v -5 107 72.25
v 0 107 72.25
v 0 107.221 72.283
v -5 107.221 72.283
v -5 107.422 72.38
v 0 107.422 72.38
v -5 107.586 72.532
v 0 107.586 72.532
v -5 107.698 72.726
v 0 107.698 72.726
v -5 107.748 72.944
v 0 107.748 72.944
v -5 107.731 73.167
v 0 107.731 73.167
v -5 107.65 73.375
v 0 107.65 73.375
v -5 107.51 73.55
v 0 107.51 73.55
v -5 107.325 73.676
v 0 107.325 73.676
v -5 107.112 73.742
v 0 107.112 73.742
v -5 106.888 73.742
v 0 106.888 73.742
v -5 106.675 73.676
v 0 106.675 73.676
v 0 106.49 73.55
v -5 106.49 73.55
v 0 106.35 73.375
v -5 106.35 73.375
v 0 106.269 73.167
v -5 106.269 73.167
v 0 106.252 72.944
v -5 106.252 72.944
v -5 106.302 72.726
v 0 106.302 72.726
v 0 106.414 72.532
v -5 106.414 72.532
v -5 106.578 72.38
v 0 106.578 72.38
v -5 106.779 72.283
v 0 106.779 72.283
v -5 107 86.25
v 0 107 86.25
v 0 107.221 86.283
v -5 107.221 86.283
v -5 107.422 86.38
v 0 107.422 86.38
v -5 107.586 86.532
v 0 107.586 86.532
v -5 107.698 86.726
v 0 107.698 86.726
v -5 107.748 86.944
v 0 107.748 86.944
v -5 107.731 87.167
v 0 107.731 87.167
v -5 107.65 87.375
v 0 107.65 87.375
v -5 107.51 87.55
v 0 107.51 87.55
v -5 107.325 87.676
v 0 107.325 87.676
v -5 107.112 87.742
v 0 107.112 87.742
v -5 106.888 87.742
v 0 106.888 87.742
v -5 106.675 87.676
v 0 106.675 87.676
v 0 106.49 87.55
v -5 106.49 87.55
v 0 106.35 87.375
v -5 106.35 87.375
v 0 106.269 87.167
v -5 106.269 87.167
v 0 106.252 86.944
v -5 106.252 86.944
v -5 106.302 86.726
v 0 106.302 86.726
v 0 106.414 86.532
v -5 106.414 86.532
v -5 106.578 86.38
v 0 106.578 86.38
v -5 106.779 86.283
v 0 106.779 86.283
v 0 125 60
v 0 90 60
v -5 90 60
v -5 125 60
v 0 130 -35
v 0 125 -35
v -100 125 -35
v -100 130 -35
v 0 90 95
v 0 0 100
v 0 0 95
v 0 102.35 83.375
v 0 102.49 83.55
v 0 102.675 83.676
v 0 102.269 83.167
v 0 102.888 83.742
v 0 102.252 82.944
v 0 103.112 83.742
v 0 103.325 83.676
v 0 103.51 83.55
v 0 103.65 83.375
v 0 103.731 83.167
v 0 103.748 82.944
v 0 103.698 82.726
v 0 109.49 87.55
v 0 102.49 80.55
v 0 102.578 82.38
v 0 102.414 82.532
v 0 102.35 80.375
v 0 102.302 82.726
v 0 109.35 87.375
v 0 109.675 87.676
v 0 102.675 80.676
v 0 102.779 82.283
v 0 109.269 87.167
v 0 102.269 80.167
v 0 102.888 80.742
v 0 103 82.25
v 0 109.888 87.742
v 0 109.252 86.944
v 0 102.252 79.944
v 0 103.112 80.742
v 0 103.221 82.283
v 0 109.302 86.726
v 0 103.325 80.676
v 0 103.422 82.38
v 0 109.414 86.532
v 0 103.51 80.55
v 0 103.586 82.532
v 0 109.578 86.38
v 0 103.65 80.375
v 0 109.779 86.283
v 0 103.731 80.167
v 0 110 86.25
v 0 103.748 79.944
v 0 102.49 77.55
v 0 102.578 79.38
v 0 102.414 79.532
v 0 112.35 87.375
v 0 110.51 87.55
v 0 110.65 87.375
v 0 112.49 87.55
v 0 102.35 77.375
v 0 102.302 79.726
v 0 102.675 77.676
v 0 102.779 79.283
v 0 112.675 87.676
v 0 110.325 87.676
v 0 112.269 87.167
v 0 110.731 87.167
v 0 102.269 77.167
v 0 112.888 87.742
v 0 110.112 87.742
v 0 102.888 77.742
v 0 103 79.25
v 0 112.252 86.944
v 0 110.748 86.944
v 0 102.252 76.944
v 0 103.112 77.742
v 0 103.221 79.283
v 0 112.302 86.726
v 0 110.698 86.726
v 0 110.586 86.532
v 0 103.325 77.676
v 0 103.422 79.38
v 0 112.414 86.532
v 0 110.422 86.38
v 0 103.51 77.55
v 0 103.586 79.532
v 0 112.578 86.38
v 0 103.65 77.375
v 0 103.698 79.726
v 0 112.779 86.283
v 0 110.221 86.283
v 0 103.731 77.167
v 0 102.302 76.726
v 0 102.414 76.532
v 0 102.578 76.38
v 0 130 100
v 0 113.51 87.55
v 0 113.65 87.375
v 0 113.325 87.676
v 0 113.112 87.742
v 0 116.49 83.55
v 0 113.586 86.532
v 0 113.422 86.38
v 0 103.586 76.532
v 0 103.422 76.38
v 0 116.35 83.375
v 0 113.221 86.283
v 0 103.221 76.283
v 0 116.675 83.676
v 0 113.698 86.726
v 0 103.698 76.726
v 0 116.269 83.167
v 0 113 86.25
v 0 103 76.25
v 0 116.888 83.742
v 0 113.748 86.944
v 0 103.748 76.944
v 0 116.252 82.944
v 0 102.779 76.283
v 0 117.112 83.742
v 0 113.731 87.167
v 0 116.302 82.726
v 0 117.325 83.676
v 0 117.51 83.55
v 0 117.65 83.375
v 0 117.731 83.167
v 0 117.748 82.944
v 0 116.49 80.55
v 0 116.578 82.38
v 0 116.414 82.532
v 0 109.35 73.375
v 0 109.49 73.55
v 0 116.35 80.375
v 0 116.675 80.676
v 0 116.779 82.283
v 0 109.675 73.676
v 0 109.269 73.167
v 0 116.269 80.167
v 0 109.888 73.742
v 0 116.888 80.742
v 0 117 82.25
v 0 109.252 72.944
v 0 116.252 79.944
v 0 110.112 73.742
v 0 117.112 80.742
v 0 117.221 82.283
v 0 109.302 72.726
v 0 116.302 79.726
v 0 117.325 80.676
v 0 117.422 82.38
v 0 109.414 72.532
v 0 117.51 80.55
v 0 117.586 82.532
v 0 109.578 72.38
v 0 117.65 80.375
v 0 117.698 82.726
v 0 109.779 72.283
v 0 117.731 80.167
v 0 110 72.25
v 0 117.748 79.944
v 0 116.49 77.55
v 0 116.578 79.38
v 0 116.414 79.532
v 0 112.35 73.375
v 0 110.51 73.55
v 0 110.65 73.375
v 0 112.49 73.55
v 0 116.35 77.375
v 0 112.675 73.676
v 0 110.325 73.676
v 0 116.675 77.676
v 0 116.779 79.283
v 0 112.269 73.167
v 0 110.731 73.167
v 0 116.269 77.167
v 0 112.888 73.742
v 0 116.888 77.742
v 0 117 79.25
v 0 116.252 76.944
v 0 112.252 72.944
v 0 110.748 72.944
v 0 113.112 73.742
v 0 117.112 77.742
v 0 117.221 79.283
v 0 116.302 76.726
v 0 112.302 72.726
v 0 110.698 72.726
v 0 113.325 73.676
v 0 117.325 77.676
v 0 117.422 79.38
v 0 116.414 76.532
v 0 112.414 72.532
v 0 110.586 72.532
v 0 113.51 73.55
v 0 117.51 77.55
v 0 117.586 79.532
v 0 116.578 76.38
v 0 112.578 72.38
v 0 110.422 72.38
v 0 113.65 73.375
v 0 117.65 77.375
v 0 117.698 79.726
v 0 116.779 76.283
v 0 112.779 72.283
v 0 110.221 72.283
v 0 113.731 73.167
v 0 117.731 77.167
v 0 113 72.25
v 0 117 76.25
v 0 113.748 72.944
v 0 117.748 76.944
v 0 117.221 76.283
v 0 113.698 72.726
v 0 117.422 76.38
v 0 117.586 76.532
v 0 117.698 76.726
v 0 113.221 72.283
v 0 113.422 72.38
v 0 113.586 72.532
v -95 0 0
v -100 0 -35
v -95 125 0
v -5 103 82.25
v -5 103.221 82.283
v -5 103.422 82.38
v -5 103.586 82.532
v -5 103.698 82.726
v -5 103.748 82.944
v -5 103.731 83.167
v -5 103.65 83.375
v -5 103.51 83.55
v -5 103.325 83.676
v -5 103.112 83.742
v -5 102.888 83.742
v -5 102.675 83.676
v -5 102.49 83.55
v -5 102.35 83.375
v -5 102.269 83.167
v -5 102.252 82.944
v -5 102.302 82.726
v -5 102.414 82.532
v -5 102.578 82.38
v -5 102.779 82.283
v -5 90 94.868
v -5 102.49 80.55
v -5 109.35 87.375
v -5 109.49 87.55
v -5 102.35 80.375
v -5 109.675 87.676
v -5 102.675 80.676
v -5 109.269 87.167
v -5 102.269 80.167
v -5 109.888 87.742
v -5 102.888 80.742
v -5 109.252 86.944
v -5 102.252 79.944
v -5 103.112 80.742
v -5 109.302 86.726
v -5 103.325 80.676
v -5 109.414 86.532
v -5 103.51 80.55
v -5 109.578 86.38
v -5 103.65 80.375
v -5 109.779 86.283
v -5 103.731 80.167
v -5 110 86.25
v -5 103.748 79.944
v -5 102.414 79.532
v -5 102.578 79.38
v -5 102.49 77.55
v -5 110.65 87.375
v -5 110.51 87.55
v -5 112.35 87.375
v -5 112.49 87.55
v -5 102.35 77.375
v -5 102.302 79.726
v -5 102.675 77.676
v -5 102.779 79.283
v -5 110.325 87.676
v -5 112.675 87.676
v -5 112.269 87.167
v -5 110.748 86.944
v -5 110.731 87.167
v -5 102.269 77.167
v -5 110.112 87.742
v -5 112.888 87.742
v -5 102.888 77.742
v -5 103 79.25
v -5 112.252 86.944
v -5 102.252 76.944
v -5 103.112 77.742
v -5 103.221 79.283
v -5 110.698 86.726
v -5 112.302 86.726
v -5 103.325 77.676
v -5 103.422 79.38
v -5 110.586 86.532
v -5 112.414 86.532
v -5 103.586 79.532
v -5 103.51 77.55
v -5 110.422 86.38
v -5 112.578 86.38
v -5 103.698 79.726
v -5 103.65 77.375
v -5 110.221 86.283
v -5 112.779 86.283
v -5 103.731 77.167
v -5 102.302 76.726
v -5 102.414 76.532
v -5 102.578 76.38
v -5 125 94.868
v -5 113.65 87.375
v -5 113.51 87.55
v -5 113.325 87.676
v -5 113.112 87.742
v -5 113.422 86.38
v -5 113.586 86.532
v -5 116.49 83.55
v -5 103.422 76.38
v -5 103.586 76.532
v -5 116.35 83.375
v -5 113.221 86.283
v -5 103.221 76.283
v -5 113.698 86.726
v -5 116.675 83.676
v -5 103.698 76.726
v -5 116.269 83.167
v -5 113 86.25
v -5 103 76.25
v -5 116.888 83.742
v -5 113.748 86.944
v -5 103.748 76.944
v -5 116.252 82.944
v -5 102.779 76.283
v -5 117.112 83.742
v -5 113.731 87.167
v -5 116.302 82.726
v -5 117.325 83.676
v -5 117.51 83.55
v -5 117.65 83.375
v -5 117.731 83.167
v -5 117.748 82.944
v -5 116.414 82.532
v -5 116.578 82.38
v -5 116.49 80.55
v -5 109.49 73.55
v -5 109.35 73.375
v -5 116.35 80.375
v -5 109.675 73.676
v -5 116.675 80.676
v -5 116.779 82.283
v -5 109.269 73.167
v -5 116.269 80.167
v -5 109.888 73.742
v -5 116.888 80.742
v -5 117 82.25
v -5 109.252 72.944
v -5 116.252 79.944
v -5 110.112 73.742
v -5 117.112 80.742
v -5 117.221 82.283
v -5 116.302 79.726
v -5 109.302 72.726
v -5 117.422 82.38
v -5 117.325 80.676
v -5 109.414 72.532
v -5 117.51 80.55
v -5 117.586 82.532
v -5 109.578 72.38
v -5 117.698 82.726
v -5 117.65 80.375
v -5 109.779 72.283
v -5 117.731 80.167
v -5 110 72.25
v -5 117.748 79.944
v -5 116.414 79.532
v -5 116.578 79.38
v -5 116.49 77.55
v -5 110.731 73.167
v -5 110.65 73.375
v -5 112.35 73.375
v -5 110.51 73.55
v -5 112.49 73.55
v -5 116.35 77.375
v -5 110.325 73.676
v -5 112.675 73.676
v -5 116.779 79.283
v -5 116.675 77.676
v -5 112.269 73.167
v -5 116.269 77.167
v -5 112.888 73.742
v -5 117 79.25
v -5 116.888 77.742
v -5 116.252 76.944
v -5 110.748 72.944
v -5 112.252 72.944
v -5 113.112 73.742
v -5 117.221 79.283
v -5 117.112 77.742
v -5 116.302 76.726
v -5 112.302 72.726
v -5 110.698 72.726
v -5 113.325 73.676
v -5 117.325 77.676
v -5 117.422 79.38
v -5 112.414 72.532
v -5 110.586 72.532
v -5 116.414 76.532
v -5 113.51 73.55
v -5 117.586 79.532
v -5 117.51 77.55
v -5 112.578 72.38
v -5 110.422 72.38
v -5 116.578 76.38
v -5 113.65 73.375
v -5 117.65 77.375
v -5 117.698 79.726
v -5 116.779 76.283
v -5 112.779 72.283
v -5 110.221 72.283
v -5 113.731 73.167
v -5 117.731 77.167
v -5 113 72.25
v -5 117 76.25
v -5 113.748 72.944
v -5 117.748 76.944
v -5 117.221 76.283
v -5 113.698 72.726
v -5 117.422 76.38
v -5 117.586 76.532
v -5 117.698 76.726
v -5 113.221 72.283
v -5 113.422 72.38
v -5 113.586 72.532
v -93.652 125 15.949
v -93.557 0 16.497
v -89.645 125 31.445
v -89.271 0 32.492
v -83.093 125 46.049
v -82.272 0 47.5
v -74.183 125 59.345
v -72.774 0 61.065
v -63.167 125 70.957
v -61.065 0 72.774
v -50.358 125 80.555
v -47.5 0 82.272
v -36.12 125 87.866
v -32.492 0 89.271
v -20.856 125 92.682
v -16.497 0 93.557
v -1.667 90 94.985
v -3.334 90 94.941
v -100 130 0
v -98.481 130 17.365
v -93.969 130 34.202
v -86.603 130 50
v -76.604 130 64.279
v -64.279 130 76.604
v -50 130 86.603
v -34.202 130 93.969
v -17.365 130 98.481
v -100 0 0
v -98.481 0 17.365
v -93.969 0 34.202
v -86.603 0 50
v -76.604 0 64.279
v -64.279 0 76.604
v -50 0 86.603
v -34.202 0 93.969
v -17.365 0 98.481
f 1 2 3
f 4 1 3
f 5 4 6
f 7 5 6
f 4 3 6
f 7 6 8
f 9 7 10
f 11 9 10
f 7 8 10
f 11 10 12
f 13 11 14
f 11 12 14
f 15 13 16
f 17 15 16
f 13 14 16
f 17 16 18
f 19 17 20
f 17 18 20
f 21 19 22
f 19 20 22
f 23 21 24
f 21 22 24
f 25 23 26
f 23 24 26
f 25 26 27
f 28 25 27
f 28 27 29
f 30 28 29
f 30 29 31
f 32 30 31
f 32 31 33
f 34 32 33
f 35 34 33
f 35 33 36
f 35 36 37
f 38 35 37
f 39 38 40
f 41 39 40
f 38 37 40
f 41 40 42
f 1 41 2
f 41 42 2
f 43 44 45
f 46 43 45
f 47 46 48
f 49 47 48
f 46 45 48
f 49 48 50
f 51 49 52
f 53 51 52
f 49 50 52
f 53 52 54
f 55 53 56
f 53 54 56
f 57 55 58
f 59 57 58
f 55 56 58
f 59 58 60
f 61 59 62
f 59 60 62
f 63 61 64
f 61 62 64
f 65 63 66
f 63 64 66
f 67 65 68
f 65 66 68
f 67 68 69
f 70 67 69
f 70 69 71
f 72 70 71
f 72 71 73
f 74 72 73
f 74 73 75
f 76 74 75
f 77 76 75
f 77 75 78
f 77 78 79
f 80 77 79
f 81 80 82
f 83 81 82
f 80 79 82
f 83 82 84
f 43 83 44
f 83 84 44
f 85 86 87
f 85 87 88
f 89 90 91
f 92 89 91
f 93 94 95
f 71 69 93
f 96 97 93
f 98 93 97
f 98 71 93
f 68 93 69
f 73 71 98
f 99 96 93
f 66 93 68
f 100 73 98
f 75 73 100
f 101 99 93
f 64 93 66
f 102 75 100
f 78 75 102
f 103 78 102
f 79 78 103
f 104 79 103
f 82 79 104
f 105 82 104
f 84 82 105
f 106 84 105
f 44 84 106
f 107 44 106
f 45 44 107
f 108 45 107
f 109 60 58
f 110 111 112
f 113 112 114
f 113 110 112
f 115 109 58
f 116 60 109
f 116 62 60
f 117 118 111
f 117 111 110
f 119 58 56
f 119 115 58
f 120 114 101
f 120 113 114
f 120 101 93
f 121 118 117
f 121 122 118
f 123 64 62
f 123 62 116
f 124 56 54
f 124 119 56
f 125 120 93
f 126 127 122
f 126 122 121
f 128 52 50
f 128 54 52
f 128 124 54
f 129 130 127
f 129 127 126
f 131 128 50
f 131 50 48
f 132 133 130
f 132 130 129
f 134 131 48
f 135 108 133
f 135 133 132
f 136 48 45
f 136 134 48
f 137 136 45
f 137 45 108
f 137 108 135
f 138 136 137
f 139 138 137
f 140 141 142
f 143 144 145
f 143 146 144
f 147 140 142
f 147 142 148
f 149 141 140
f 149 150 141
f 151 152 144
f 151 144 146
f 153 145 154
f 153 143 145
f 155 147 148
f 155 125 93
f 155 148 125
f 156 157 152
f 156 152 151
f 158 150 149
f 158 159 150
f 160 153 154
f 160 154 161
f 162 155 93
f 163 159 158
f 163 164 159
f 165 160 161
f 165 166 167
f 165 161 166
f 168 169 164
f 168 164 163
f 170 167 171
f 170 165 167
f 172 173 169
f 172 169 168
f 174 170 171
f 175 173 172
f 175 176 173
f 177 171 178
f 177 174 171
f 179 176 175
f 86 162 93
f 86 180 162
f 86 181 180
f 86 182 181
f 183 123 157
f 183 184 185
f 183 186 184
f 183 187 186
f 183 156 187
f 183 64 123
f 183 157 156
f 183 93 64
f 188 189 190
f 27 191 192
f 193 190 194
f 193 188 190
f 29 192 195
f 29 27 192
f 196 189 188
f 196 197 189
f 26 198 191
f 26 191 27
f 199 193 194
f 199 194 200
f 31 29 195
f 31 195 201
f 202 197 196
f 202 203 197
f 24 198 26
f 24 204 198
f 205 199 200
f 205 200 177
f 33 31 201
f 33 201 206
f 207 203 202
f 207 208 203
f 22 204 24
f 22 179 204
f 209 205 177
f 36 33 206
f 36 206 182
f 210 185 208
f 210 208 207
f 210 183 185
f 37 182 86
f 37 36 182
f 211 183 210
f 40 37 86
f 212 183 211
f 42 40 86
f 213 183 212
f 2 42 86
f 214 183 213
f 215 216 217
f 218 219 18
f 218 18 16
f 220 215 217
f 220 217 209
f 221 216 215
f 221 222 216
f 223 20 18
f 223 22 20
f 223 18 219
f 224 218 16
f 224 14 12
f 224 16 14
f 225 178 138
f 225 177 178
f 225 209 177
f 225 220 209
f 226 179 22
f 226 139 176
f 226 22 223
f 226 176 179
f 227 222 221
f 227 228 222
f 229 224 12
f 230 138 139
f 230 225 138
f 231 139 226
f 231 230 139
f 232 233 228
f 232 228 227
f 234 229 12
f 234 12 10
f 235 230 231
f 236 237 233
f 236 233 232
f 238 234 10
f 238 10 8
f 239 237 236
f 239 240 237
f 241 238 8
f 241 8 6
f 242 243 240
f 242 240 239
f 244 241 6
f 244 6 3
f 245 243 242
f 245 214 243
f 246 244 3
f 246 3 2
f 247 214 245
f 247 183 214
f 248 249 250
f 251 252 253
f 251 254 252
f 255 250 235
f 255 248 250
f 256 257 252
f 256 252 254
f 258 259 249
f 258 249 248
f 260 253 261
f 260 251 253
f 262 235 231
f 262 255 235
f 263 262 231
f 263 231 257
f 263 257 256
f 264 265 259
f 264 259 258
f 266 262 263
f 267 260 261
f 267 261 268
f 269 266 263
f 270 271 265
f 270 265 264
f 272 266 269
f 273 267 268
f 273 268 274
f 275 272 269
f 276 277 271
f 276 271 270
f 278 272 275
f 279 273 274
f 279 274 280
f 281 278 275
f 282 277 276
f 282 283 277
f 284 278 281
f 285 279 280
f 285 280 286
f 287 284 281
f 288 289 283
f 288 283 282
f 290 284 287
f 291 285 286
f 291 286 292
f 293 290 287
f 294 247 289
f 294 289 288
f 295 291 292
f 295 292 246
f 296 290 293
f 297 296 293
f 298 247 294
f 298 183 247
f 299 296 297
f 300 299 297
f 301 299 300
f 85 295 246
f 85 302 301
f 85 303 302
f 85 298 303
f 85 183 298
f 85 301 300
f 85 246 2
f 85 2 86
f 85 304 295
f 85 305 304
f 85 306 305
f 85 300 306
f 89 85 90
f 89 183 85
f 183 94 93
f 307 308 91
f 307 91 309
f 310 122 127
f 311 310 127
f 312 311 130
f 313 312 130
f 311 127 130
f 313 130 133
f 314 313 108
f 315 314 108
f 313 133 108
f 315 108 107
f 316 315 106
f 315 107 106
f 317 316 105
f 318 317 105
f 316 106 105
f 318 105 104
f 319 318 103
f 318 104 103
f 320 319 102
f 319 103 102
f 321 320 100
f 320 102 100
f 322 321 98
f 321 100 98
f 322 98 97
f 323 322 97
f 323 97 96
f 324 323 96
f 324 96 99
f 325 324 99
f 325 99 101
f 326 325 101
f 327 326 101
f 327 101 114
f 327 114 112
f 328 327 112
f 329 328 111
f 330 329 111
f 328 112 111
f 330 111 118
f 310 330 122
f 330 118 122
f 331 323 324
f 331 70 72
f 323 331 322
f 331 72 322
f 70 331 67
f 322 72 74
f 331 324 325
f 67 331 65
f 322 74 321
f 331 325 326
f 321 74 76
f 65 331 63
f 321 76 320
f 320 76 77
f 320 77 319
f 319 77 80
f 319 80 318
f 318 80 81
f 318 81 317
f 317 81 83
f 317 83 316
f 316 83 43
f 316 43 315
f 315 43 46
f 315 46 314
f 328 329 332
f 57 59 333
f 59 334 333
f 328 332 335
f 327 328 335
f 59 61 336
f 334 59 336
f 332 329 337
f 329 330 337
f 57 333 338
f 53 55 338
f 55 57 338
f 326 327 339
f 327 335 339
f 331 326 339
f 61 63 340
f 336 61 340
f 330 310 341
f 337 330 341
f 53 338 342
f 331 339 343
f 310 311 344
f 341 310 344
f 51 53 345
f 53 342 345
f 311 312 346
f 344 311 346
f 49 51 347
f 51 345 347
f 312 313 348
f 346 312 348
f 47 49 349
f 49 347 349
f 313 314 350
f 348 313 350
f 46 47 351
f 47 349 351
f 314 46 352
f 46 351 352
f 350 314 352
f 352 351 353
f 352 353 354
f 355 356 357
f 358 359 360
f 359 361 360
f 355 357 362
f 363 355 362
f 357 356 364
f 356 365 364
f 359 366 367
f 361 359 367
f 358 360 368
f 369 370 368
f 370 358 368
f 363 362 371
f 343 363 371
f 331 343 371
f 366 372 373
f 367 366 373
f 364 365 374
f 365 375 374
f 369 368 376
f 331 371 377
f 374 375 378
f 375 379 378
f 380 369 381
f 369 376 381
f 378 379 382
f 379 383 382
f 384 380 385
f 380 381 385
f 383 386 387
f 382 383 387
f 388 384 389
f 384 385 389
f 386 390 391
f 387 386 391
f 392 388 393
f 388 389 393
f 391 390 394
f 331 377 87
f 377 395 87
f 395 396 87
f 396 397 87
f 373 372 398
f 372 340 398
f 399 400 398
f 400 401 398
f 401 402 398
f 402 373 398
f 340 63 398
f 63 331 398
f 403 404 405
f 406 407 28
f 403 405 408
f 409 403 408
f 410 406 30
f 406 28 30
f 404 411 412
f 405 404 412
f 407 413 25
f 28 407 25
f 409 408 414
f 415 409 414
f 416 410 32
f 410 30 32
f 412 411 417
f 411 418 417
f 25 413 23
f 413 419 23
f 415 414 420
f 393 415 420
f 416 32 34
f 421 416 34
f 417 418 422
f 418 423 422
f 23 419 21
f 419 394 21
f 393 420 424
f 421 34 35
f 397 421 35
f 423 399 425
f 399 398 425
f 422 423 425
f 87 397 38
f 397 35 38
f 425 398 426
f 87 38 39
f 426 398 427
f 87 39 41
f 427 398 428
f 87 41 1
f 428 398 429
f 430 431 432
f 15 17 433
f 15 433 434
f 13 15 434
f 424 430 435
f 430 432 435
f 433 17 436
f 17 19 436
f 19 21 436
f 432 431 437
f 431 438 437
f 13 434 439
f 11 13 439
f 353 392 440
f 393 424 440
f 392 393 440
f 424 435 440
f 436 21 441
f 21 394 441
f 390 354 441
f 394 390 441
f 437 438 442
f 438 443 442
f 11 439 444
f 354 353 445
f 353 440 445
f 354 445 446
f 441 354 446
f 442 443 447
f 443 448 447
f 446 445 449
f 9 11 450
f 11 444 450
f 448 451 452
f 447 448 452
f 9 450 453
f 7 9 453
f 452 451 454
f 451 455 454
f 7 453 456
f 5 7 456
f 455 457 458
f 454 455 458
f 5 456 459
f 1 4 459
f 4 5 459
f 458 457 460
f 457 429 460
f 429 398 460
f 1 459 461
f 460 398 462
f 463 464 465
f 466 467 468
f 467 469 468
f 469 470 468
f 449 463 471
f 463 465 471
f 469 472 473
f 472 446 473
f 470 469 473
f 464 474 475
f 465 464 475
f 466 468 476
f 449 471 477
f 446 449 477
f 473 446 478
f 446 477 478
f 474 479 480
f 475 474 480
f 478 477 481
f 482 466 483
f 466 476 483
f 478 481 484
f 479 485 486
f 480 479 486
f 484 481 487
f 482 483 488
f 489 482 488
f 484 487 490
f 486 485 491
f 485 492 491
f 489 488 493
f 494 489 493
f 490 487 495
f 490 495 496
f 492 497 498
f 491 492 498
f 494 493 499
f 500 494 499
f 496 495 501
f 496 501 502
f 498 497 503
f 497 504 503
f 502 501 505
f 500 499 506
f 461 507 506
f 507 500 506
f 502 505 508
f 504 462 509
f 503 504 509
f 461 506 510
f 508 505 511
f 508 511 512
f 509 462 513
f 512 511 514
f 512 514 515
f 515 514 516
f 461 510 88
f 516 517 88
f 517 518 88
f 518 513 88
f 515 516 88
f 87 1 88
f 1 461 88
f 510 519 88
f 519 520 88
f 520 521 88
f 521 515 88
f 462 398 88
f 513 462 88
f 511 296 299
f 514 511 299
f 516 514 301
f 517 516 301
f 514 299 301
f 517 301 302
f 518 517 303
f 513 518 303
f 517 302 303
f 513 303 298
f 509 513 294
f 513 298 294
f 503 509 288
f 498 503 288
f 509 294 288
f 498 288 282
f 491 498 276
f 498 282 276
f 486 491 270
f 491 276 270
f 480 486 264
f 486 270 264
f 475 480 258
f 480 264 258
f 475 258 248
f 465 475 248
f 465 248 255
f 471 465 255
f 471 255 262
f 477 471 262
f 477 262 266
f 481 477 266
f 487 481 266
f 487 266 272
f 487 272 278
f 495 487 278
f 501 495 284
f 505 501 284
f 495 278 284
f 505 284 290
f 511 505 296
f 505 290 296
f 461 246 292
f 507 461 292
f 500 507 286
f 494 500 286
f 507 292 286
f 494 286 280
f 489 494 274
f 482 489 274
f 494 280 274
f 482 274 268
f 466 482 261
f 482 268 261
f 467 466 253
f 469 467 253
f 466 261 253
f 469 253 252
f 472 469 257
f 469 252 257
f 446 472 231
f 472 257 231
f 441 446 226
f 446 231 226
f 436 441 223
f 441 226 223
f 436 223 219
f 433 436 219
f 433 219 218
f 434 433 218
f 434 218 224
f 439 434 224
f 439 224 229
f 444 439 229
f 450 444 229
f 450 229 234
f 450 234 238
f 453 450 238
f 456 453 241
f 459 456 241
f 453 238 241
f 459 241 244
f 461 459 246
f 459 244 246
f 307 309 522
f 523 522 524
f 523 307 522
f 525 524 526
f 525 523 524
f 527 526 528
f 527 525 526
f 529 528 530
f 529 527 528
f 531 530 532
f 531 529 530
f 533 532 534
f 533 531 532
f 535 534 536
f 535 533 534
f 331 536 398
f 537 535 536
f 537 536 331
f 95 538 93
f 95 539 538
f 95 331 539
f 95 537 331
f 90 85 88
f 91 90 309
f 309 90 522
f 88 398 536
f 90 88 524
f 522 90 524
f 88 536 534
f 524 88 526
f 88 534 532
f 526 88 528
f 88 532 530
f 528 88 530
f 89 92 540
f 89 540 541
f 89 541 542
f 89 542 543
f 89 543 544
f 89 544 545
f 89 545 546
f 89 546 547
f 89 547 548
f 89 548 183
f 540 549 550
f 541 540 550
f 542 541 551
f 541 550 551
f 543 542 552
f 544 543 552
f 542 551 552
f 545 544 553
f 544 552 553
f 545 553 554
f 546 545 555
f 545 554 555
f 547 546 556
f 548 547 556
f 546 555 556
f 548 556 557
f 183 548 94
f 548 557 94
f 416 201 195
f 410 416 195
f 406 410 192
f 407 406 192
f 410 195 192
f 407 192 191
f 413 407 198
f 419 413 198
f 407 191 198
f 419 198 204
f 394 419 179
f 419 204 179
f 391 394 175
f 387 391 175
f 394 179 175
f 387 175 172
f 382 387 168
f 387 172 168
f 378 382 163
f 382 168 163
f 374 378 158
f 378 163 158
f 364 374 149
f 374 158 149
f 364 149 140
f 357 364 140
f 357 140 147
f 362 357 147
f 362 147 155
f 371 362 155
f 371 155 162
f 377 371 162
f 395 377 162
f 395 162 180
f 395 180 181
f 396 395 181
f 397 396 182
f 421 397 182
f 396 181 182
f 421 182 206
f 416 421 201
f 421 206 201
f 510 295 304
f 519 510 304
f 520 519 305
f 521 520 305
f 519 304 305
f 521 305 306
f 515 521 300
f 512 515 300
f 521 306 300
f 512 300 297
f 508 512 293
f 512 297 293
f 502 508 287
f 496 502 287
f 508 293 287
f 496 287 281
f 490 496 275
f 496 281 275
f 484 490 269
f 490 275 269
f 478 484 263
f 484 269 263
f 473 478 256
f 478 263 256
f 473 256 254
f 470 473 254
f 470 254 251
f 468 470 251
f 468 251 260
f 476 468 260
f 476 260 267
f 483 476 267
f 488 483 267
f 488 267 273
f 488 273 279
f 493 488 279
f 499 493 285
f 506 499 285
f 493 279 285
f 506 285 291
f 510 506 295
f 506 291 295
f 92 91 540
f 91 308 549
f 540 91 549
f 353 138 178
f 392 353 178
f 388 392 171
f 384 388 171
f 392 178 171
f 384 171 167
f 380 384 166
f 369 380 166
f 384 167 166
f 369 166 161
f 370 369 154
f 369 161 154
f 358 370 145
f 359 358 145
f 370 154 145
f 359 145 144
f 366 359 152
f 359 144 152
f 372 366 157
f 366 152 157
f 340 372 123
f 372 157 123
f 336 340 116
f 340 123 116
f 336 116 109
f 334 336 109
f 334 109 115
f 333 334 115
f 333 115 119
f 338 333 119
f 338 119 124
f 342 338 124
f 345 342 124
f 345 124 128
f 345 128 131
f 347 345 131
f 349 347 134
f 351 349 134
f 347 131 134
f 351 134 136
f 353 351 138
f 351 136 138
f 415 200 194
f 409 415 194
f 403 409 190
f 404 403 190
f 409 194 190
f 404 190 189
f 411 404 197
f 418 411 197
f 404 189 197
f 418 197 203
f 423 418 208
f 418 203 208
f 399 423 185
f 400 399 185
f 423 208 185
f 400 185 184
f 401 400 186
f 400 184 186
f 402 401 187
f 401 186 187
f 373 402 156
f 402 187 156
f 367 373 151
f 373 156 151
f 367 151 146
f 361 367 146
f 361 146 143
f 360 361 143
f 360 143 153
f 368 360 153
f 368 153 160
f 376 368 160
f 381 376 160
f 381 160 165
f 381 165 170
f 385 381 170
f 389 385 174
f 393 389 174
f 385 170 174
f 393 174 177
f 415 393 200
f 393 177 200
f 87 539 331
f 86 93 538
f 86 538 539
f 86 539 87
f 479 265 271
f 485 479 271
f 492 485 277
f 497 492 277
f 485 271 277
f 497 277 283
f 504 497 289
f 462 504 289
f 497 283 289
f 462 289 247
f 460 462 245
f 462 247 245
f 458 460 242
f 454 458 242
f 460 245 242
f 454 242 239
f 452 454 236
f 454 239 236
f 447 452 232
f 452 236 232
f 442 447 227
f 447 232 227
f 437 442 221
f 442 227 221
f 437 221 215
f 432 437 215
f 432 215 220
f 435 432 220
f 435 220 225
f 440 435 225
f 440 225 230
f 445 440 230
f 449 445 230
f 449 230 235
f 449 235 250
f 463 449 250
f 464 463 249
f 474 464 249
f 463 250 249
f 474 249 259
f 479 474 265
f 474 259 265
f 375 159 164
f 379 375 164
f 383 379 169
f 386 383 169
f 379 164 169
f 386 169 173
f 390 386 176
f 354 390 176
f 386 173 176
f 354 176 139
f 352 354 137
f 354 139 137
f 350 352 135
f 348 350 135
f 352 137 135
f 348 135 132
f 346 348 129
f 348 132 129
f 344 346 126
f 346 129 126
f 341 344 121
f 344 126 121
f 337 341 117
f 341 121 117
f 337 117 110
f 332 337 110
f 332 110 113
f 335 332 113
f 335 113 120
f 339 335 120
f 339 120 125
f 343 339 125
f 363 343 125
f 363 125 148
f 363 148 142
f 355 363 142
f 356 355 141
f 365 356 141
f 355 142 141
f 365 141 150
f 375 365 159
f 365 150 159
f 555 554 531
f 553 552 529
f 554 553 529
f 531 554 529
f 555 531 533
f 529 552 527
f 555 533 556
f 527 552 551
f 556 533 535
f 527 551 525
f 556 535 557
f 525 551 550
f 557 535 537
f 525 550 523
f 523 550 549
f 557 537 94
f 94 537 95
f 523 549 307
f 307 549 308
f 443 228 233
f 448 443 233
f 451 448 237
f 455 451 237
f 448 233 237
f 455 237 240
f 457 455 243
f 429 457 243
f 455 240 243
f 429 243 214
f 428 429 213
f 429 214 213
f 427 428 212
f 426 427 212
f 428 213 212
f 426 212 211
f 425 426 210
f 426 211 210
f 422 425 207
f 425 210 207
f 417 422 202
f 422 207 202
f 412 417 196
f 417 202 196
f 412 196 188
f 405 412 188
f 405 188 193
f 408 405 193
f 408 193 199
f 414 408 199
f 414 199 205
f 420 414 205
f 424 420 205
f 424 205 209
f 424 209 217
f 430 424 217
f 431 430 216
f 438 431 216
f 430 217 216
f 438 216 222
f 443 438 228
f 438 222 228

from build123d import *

# Parameters (mm, degrees)
BOSS_EXTRUDE1_DEPTH = 130
CUT_EXTRUDE1_DEPTH  = 125
SKETCH7_W           = 35
SKETCH7_H           = 35
BOSS_EXTRUDE3_DEPTH = 5
SKETCH8_R           = 0.75
CUT_EXTRUDE2_DEPTH  = 5


with BuildPart() as part:
    # Sketch2 → Boss-Extrude1 (new body)
    with BuildSketch(Plane(origin=(0, 0, 0), x_dir=(1, 0, 0), z_dir=(0, 1, 0))):
        with BuildLine():
            Line((0, -100), (0, 35))
            Line((0, 35), (-100, 35))
            Line((-100, 35), (-100, 0))
            ThreePointArc((-100, 0), (-70.710678119, -70.710678119), (0, -100))
        make_face()
    extrude(amount=BOSS_EXTRUDE1_DEPTH)

    # Sketch3 → Cut-Extrude1 (cut)
    with BuildSketch(Plane.XZ):
        with BuildLine():
            Line((0, 95), (0, -35))
            Line((0, -35), (-100, -35))
            Line((-100, -35), (-95, 0))
            ThreePointArc((-95, 0), (-67.175144213, 67.175144213), (0, 95))
        make_face()
    extrude(amount=-CUT_EXTRUDE1_DEPTH, mode=Mode.SUBTRACT)

    # Sketch7 → Boss-Extrude3 (add)
    with BuildSketch(Plane(origin=(0, 0, 0), x_dir=(0, 0, -1), z_dir=(1, 0, 0))):
        with Locations((-77.5, 107.5)):
            Rectangle(SKETCH7_W, SKETCH7_H)
    extrude(amount=-BOSS_EXTRUDE3_DEPTH)

    # Sketch8 → Cut-Extrude2 (cut)
    with BuildSketch(Plane(origin=(0, 0, 0), x_dir=(0, 0, -1), z_dir=(1, 0, 0))):
        with Locations((-87, 110)):
            Circle(SKETCH8_R)
        with Locations((-87, 107)):
            Circle(SKETCH8_R)
        with Locations((-87, 113)):
            Circle(SKETCH8_R)
        with Locations((-77, 117)):
            Circle(SKETCH8_R)
        with Locations((-80, 117)):
            Circle(SKETCH8_R)
        with Locations((-83, 117)):
            Circle(SKETCH8_R)
        with Locations((-73, 107)):
            Circle(SKETCH8_R)
        with Locations((-73, 110)):
            Circle(SKETCH8_R)
        with Locations((-73, 113)):
            Circle(SKETCH8_R)
        with Locations((-83, 103)):
            Circle(SKETCH8_R)
        with Locations((-80, 103)):
            Circle(SKETCH8_R)
        with Locations((-77, 103)):
            Circle(SKETCH8_R)
    extrude(amount=-CUT_EXTRUDE2_DEPTH, mode=Mode.SUBTRACT)


solid = part.part
